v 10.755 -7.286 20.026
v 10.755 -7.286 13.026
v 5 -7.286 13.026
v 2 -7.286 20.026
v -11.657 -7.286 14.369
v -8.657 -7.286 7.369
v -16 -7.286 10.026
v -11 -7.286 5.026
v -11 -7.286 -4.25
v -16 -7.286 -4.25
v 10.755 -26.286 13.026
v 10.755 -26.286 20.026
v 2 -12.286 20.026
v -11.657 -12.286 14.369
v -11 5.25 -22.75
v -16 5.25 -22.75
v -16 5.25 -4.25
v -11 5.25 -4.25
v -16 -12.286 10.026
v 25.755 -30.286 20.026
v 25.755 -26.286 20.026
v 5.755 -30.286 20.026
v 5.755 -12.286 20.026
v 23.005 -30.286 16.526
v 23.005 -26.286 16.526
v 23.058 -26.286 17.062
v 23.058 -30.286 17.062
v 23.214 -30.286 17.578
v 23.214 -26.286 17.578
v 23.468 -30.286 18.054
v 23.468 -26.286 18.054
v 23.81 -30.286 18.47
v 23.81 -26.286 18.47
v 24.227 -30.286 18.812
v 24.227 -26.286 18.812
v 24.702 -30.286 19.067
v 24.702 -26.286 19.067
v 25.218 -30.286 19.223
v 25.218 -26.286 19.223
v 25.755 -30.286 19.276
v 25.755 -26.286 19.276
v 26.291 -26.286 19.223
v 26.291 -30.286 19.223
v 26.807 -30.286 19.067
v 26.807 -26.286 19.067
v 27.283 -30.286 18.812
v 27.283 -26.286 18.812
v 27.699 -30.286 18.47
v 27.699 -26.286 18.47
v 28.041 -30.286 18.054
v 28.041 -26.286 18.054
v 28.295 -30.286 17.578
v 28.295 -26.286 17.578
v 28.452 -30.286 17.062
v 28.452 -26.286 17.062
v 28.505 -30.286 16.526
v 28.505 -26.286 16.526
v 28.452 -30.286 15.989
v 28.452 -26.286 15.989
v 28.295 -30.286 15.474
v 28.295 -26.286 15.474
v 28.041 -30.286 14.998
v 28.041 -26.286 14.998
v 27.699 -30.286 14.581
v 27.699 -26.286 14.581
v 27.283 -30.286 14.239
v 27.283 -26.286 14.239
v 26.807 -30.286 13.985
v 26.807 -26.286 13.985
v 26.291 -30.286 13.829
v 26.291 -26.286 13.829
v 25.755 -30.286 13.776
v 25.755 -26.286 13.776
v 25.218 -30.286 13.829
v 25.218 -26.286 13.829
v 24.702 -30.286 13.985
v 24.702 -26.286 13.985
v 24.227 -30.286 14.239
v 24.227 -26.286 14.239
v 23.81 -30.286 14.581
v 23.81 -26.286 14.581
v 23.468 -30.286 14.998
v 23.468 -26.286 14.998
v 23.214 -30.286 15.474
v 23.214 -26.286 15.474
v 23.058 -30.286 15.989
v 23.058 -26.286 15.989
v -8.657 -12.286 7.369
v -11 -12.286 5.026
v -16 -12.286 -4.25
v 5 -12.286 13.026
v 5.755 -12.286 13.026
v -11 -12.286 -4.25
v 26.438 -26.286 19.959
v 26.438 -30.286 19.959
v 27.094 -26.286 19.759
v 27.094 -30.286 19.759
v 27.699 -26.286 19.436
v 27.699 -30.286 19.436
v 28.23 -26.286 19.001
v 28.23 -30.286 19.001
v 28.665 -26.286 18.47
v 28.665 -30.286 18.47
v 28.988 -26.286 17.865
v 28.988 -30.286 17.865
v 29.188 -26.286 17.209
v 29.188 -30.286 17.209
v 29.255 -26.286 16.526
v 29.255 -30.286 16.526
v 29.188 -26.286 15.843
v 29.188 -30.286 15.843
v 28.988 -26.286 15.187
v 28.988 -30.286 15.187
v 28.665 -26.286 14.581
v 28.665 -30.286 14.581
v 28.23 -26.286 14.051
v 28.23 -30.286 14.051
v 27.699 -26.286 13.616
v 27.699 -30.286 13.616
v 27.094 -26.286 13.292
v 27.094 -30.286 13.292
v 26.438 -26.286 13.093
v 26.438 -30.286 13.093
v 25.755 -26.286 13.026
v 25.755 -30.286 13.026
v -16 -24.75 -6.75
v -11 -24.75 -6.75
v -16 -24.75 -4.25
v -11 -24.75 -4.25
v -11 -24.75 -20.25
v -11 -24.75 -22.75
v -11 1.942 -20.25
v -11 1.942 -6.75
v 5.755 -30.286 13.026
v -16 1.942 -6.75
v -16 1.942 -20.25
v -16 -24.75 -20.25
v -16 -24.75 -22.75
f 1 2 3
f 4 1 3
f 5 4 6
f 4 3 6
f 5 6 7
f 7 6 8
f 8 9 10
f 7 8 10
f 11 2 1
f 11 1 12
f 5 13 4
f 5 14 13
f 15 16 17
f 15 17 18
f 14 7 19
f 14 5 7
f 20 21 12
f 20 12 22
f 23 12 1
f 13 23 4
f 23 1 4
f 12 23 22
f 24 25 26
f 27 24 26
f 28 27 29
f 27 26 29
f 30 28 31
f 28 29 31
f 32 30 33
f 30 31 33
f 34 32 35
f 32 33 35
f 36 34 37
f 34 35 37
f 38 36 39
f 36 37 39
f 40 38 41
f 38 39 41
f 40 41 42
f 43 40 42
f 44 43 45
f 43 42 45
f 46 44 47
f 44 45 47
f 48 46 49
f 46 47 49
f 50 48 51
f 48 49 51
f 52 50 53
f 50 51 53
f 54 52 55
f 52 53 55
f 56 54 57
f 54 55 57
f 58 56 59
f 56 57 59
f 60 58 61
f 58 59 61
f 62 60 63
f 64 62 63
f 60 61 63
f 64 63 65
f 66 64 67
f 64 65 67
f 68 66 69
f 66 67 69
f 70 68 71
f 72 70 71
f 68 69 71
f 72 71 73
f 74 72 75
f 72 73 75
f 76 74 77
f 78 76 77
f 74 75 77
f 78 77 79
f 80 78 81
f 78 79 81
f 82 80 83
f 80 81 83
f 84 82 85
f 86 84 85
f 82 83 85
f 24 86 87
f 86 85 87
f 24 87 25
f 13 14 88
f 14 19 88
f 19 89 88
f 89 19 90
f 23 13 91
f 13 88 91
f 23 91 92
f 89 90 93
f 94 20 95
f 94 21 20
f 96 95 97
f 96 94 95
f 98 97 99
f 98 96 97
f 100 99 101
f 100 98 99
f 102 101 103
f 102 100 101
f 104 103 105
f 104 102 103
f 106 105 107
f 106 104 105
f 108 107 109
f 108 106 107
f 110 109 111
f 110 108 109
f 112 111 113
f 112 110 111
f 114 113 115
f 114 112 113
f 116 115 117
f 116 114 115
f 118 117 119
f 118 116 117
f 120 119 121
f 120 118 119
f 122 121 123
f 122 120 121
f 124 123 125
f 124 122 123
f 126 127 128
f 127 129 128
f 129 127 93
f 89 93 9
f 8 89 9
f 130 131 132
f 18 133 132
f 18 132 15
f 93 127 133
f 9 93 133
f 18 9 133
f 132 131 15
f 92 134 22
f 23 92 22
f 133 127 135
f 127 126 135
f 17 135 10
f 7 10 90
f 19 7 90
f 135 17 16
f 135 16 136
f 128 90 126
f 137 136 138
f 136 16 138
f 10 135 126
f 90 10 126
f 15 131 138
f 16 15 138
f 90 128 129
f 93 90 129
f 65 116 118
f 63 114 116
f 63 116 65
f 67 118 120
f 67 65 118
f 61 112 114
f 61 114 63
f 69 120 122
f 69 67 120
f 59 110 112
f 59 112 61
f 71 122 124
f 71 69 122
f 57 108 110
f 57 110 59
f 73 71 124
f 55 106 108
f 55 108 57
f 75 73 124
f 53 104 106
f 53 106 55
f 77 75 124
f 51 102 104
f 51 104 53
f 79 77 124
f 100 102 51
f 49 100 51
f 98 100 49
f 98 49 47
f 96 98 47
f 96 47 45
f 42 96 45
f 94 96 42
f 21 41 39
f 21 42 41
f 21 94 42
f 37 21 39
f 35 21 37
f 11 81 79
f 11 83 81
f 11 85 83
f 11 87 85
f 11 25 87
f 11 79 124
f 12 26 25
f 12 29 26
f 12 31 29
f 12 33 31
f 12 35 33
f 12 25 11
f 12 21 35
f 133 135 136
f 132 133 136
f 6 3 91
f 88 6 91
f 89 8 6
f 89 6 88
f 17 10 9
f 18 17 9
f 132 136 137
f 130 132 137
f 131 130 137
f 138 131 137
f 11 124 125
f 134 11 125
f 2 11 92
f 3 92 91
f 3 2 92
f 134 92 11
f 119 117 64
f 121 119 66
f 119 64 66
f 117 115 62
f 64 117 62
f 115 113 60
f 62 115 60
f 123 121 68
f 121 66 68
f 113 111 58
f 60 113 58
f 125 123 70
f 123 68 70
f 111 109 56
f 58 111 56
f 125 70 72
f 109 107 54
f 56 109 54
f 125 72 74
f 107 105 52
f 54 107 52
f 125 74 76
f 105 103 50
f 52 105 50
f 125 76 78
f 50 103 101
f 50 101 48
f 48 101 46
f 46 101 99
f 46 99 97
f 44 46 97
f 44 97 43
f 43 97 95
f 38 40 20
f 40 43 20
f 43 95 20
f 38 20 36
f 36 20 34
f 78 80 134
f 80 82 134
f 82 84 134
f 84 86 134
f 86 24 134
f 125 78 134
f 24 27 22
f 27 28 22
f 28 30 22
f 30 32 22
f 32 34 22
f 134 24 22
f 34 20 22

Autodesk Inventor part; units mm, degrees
ref_plane "YZ Plane" through (0, 0, 0) normal (1, 0, 0) x (0, 1, 0)
ref_plane "XZ Plane" through (0, 0, 0) normal (0, 1, 0) x (-1, 0, 0)
ref_plane "Work Plane7" through (19.7548, -26.2861, 10.5259) normal (0, -1, 0) x (1, 0, 0)
sketch "Sketch10" plane through (0, 0, 0) normal (0, 1, 0) x (-1, 0, 0)
  line L0 (-27.0112, 18.5709) -> (-26.4391, 18.8263) projected
  line L1 (-25.8204, 18.925) -> (-26.4391, 18.8263) projected
  line L2 (-25.1972, 18.8603) -> (-25.8204, 18.925) projected
  line L3 (-24.6121, 18.6364) -> (-25.1972, 18.8603) projected
  line L4 (-24.1048, 18.2687) -> (-24.6121, 18.6364) projected
  line L5 (-23.7099, 17.7823) -> (-24.1048, 18.2687) projected
  line L6 (-23.4545, 17.2102) -> (-23.7099, 17.7823) projected
  line L7 (-23.4545, 17.2102) -> (-23.3557, 16.5915) projected
  line L8 (-23.4205, 15.9683) -> (-23.3557, 16.5915) projected
  line L9 (-23.4205, 15.9683) -> (-23.6444, 15.3832) projected
  line L10 (-23.6444, 15.3832) -> (-24.0121, 14.8759) projected
  line L11 (-24.0121, 14.8759) -> (-24.4985, 14.481) projected
  line L12 (-24.4985, 14.481) -> (-25.0706, 14.2256) projected
  line L13 (-25.0706, 14.2256) -> (-25.6893, 14.1268) projected
  line L14 (-25.6893, 14.1268) -> (-26.3125, 14.1916) projected
  line L15 (-26.3125, 14.1916) -> (-26.8976, 14.4155) projected
  line L16 (-26.8976, 14.4155) -> (-27.4049, 14.7832) projected
  line L17 (-27.4049, 14.7832) -> (-27.7998, 15.2696) projected
  line L18 (-28.0552, 15.8417) -> (-27.7998, 15.2696) projected
  line L19 (-28.0552, 15.8417) -> (-28.1539, 16.4604) projected
  line L20 (-28.1539, 16.4604) -> (-28.0892, 17.0836) projected
  line L21 (-28.0892, 17.0836) -> (-27.8653, 17.6687) projected
  line L22 (-27.8653, 17.6687) -> (-27.4976, 18.176) projected
  line L23 (-27.0112, 18.5709) -> (-27.4976, 18.176) projected
  line L24 (-26.7545, 16.4986) -> (-26.7275, 16.7583) projected
  line L25 (-26.7133, 16.2408) -> (-26.7545, 16.4986) projected
  line L26 (-26.6069, 16.0025) -> (-26.7133, 16.2408) projected
  line L27 (-26.4424, 15.7998) -> (-26.6069, 16.0025) projected
  line L28 (-26.231, 15.6466) -> (-26.4424, 15.7998) projected
  line L29 (-25.9872, 15.5533) -> (-26.231, 15.6466) projected
  line L30 (-25.7275, 15.5263) -> (-25.9872, 15.5533) projected
  line L31 (-25.4697, 15.5675) -> (-25.7275, 15.5263) projected
  line L32 (-25.2314, 15.6739) -> (-25.4697, 15.5675) projected
  line L33 (-25.0287, 15.8384) -> (-25.2314, 15.6739) projected
  line L34 (-24.8755, 16.0498) -> (-25.0287, 15.8384) projected
  line L35 (-24.7822, 16.2936) -> (-24.8755, 16.0498) projected
  line L36 (-24.7552, 16.5533) -> (-24.7822, 16.2936) projected
  line L37 (-24.7552, 16.5533) -> (-24.7963, 16.8111) projected
  line L38 (-24.7963, 16.8111) -> (-24.9028, 17.0494) projected
  line L39 (-24.9028, 17.0494) -> (-25.0673, 17.2521) projected
  line L40 (-25.0673, 17.2521) -> (-25.2787, 17.4053) projected
  line L41 (-25.2787, 17.4053) -> (-25.5225, 17.4986) projected
  line L42 (-25.5225, 17.4986) -> (-25.7822, 17.5256) projected
  line L43 (-25.7822, 17.5256) -> (-26.04, 17.4844) projected
  line L44 (-26.04, 17.4844) -> (-26.2783, 17.378) projected
  line L45 (-26.2783, 17.378) -> (-26.481, 17.2135) projected
  line L46 (-26.481, 17.2135) -> (-26.6342, 17.0021) projected
  line L47 (-26.6342, 17.0021) -> (-26.7275, 16.7583) projected
  line L48 (-27.0112, 18.5709) -> (-26.4391, 18.8263) projected
  line L49 (-25.8204, 18.925) -> (-26.4391, 18.8263) projected
  line L50 (-25.1972, 18.8603) -> (-25.8204, 18.925) projected
  line L51 (-24.6121, 18.6364) -> (-25.1972, 18.8603) projected
  line L52 (-24.1048, 18.2687) -> (-24.6121, 18.6364) projected
  line L53 (-23.7099, 17.7823) -> (-24.1048, 18.2687) projected
  line L54 (-23.4545, 17.2102) -> (-23.7099, 17.7823) projected
  line L55 (-23.4545, 17.2102) -> (-23.3557, 16.5915) projected
  line L56 (-23.4205, 15.9683) -> (-23.3557, 16.5915) projected
  line L57 (-23.4205, 15.9683) -> (-23.6444, 15.3832) projected
  line L58 (-23.6444, 15.3832) -> (-24.0121, 14.8759) projected
  line L59 (-24.0121, 14.8759) -> (-24.4985, 14.481) projected
  line L60 (-24.4985, 14.481) -> (-25.0706, 14.2256) projected
  line L61 (-25.0706, 14.2256) -> (-25.6893, 14.1268) projected
  line L62 (-25.6893, 14.1268) -> (-26.3125, 14.1916) projected
  line L63 (-26.3125, 14.1916) -> (-26.8976, 14.4155) projected
  line L64 (-26.8976, 14.4155) -> (-27.4049, 14.7832) projected
  line L65 (-27.4049, 14.7832) -> (-27.7998, 15.2696) projected
  line L66 (-28.0552, 15.8417) -> (-27.7998, 15.2696) projected
  line L67 (-28.0552, 15.8417) -> (-28.1539, 16.4604) projected
  line L68 (-28.1539, 16.4604) -> (-28.0892, 17.0836) projected
  line L69 (-28.0892, 17.0836) -> (-27.8653, 17.6687) projected
  line L70 (-27.8653, 17.6687) -> (-27.4976, 18.176) projected
  line L71 (-27.0112, 18.5709) -> (-27.4976, 18.176) projected
  line L72 (-26.7545, 16.4986) -> (-26.7275, 16.7583) projected
  line L73 (-26.7133, 16.2408) -> (-26.7545, 16.4986) projected
  line L74 (-26.6069, 16.0025) -> (-26.7133, 16.2408) projected
  line L75 (-26.4424, 15.7998) -> (-26.6069, 16.0025) projected
  line L76 (-26.231, 15.6466) -> (-26.4424, 15.7998) projected
  line L77 (-25.9872, 15.5533) -> (-26.231, 15.6466) projected
  line L78 (-25.7275, 15.5263) -> (-25.9872, 15.5533) projected
  line L79 (-25.4697, 15.5675) -> (-25.7275, 15.5263) projected
  line L80 (-25.2314, 15.6739) -> (-25.4697, 15.5675) projected
  line L81 (-25.0287, 15.8384) -> (-25.2314, 15.6739) projected
  line L82 (-24.8755, 16.0498) -> (-25.0287, 15.8384) projected
  line L83 (-24.7822, 16.2936) -> (-24.8755, 16.0498) projected
  line L84 (-24.7552, 16.5533) -> (-24.7822, 16.2936) projected
  line L85 (-24.7552, 16.5533) -> (-24.7963, 16.8111) projected
  line L86 (-24.7963, 16.8111) -> (-24.9028, 17.0494) projected
  line L87 (-24.9028, 17.0494) -> (-25.0673, 17.2521) projected
  line L88 (-25.0673, 17.2521) -> (-25.2787, 17.4053) projected
  line L89 (-25.2787, 17.4053) -> (-25.5225, 17.4986) projected
  line L90 (-25.5225, 17.4986) -> (-25.7822, 17.5256) projected
  line L91 (-25.7822, 17.5256) -> (-26.04, 17.4844) projected
  line L92 (-26.04, 17.4844) -> (-26.2783, 17.378) projected
  line L93 (-26.2783, 17.378) -> (-26.481, 17.2135) projected
  line L94 (-26.481, 17.2135) -> (-26.6342, 17.0021) projected
  line L95 (-26.6342, 17.0021) -> (-26.7275, 16.7583) projected
  circle A0 centre (-25.7548, 16.5259) radius 2.75
  arc A1 (-25.7548, 20.0259) -> (-25.7548, 13.0259) centre (-25.7548, 16.5259) ccw
  line L96 (-25.7548, 20.0259) -> (-5.7548, 20.0259) construction
  line L97 (-25.7548, 13.0259) -> (-5.7548, 13.0259)
  line L98 (-5.7548, 13.0259) -> (-5.7548, 20.0259)
  line L99 (-25.7548, 20.0259) -> (-5.7548, 20.0259)
  point P0 (0, 0)
  dimension "d36" = 5.5
  dimension "d37" = 7
  dimension "d40" = 20
extrude "Extrusion8" add sketch "Sketch10" against normal blind 4 from surface at -26.2861 contours L99 L98 L97 A1
sketch "Sketch12" plane through (0, 0, 0) normal (0, 1, 0) x (-1, 0, 0)
  line L0 (26.2, -19.75) -> (26.2, -7.25) projected
  line L1 (26.2, -19.75) -> (11, -19.75) projected
  line L2 (11, -7.25) -> (11, -19.75) projected
  line L3 (11, -7.25) -> (26.2, -7.25) projected
  line L4 (22.4706, -11.917) -> (22.6, -11.9) projected
  line L5 (22.35, -11.967) -> (22.4706, -11.917) projected
  line L6 (22.2464, -12.0464) -> (22.35, -11.967) projected
  line L7 (22.167, -12.15) -> (22.2464, -12.0464) projected
  line L8 (22.117, -12.2706) -> (22.167, -12.15) projected
  line L9 (22.1, -12.4) -> (22.117, -12.2706) projected
  line L10 (22.117, -12.5294) -> (22.1, -12.4) projected
  line L11 (22.167, -12.65) -> (22.117, -12.5294) projected
  line L12 (22.2464, -12.7536) -> (22.167, -12.65) projected
  line L13 (22.35, -12.833) -> (22.2464, -12.7536) projected
  line L14 (22.35, -12.833) -> (22.4706, -12.883) projected
  line L15 (22.4706, -12.883) -> (22.6, -12.9) projected
  line L16 (22.6, -12.9) -> (22.7294, -12.883) projected
  line L17 (22.85, -12.833) -> (22.7294, -12.883) projected
  line L18 (22.9536, -12.7536) -> (22.85, -12.833) projected
  line L19 (23.033, -12.65) -> (22.9536, -12.7536) projected
  line L20 (23.033, -12.65) -> (23.083, -12.5294) projected
  line L21 (23.083, -12.5294) -> (23.1, -12.4) projected
  line L22 (23.1, -12.4) -> (23.083, -12.2706) projected
  line L23 (23.083, -12.2706) -> (23.033, -12.15) projected
  line L24 (23.033, -12.15) -> (22.9536, -12.0464) projected
  line L25 (22.9536, -12.0464) -> (22.85, -11.967) projected
  line L26 (22.85, -11.967) -> (22.7294, -11.917) projected
  line L27 (22.6, -11.9) -> (22.7294, -11.917) projected
  line L28 (22.4706, -13.017) -> (22.6, -13) projected
  line L29 (22.35, -13.067) -> (22.4706, -13.017) projected
  line L30 (22.2464, -13.1464) -> (22.35, -13.067) projected
  line L31 (22.167, -13.25) -> (22.2464, -13.1464) projected
  line L32 (22.117, -13.3706) -> (22.167, -13.25) projected
  line L33 (22.1, -13.5) -> (22.117, -13.3706) projected
  line L34 (22.117, -13.6294) -> (22.1, -13.5) projected
  line L35 (22.167, -13.75) -> (22.117, -13.6294) projected
  line L36 (22.2464, -13.8536) -> (22.167, -13.75) projected
  line L37 (22.35, -13.933) -> (22.2464, -13.8536) projected
  line L38 (22.35, -13.933) -> (22.4706, -13.983) projected
  line L39 (22.4706, -13.983) -> (22.6, -14) projected
  line L40 (22.6, -14) -> (22.7294, -13.983) projected
  line L41 (22.85, -13.933) -> (22.7294, -13.983) projected
  line L42 (22.9536, -13.8536) -> (22.85, -13.933) projected
  line L43 (23.033, -13.75) -> (22.9536, -13.8536) projected
  line L44 (23.033, -13.75) -> (23.083, -13.6294) projected
  line L45 (23.083, -13.6294) -> (23.1, -13.5) projected
  line L46 (23.1, -13.5) -> (23.083, -13.3706) projected
  line L47 (23.083, -13.3706) -> (23.033, -13.25) projected
  line L48 (23.033, -13.25) -> (22.9536, -13.1464) projected
  line L49 (22.9536, -13.1464) -> (22.85, -13.067) projected
  line L50 (22.85, -13.067) -> (22.7294, -13.017) projected
  line L51 (22.6, -13) -> (22.7294, -13.017) projected
  line L52 (22.4706, -14.117) -> (22.6, -14.1) projected
  line L53 (22.35, -14.167) -> (22.4706, -14.117) projected
  line L54 (22.2464, -14.2464) -> (22.35, -14.167) projected
  line L55 (22.167, -14.35) -> (22.2464, -14.2464) projected
  line L56 (22.117, -14.4706) -> (22.167, -14.35) projected
  line L57 (22.1, -14.6) -> (22.117, -14.4706) projected
  line L58 (22.117, -14.7294) -> (22.1, -14.6) projected
  line L59 (22.167, -14.85) -> (22.117, -14.7294) projected
  line L60 (22.2464, -14.9536) -> (22.167, -14.85) projected
  line L61 (22.35, -15.033) -> (22.2464, -14.9536) projected
  line L62 (22.35, -15.033) -> (22.4706, -15.083) projected
  line L63 (22.4706, -15.083) -> (22.6, -15.1) projected
  line L64 (22.6, -15.1) -> (22.7294, -15.083) projected
  line L65 (22.85, -15.033) -> (22.7294, -15.083) projected
  line L66 (22.9536, -14.9536) -> (22.85, -15.033) projected
  line L67 (23.033, -14.85) -> (22.9536, -14.9536) projected
  line L68 (23.033, -14.85) -> (23.083, -14.7294) projected
  line L69 (23.083, -14.7294) -> (23.1, -14.6) projected
  line L70 (23.1, -14.6) -> (23.083, -14.4706) projected
  line L71 (23.083, -14.4706) -> (23.033, -14.35) projected
  line L72 (23.033, -14.35) -> (22.9536, -14.2464) projected
  line L73 (22.9536, -14.2464) -> (22.85, -14.167) projected
  line L74 (22.85, -14.167) -> (22.7294, -14.117) projected
  line L75 (22.6, -14.1) -> (22.7294, -14.117) projected
  line L76 (8.5, -12.9) -> (11, -12.9) projected
  line L77 (8.5, -7.25) -> (8.5, -12.9) projected
  line L78 (8.5, -7.25) -> (11, -7.25) projected
  line L79 (11, -12.9) -> (11, -7.25) projected
  line L80 (8.5, -19.75) -> (11, -19.75) projected
  line L81 (8.5, -14.1) -> (8.5, -19.75) projected
  line L82 (8.5, -14.1) -> (11, -14.1) projected
  line L83 (11, -19.75) -> (11, -14.1) projected
  line L84 (11, -7.25) -> (16, -7.25)
  line L85 (16, -7.25) -> (16, -19.75)
  line L86 (16, -19.75) -> (11, -19.75)
  line L87 (11, -19.75) -> (11, -7.25)
  line L88 (16, -7.25) -> (11, -7.25)
  line L89 (11, -7.25) -> (11, -4.25)
  line L90 (11, -4.25) -> (16, -4.25)
  line L91 (16, -4.25) -> (16, -7.25)
  line L92 (16, -19.75) -> (11, -19.75)
  line L93 (11, -19.75) -> (11, -22.75)
  line L94 (11, -22.75) -> (16, -22.75)
  line L95 (16, -22.75) -> (16, -19.75)
  point P0 (0, 0)
  dimension "d41" = 5
  dimension "d42" = 3
  dimension "d43" = 3
extrude "Extrusion10" add sketch "Sketch12" against normal blind 24.75 contours L95 L94 L93 L1 | L1 L2 L3 L85 | L3 L89 L90 L91
sketch "Sketch13" plane through (0, 0, 0) normal (0, 1, 0) x (1, 0, 0)
  line L0 (-16, 22.75) -> (-16, 4.25) projected
  line L1 (-16, 4.25) -> (-11, 4.25) projected
  line L2 (-11, 4.25) -> (-11, 22.75) projected
  line L3 (-11, 22.75) -> (-16, 22.75) projected
  point P0 (0, 0)
extrude "Extrusion11" add sketch "Sketch13" along normal blind 5.25
sketch "Sketch14" plane through (-16, -24.75, -4.25) normal (0, 0, 1) x (1, 0, 0)
  line L0 (0, 0) -> (0, 30) projected
  line L1 (5, 0) -> (0, 0) projected
  line L2 (5, 0) -> (5, 30) projected
  line L3 (0, 30) -> (5, 30) projected
  line L4 (21.7548, -5.5361) -> (41.7548, -5.5361) projected
  line L5 (41.7548, -1.5361) -> (41.7548, -5.5361) projected
  line L6 (21.7548, -1.5361) -> (41.7548, -1.5361) projected
  line L7 (21.7548, -5.5361) -> (21.7548, -1.5361) projected
  line L8 (21.7548, -5.5361) -> (26.7548, -5.5361)
  line L9 (26.7548, -5.5361) -> (26.7548, 12.4639)
  line L10 (26.7548, 12.4639) -> (21.7548, 12.4639)
  line L11 (21.7548, 12.4639) -> (21.7548, -5.5361)
  line L12 (0, 0) -> (0, 30) projected
  line L13 (26.7548, 12.4639) -> (0, 12.4639)
  line L14 (0, 12.4639) -> (0, 17.4639)
  line L15 (0, 17.4639) -> (26.7548, 17.4639)
  line L16 (26.7548, 17.4639) -> (26.7548, 12.4639)
  point P0 (16, 24.75)
  dimension "d48" = 5
  dimension "d49" = 18
  dimension "d50" = 5
extrude "Extrusion12" add sketch "Sketch14" along normal up to surface (7 mm away) from surface at 17.2759 contours L0 L15 L2 L13 | L2 L15 L16 L10 L13 | L10 L9 L6 L11 | L6 L9 L4 L7
sketch "Sketch15" plane through (-16, -24.75, -4.25) normal (0, 0, 1) x (1, 0, 0)
  line L0 (41.7548, -1.5361) -> (26.7548, -1.5361) projected
  line L1 (41.7548, -5.5361) -> (41.7548, -1.5361) projected
  line L2 (41.7548, -5.5361) -> (21.7548, -5.5361) projected
  line L3 (21.7548, 12.4639) -> (21.7548, -5.5361) projected
  line L4 (0, 12.4639) -> (21.7548, 12.4639) projected
  line L5 (0, 17.4639) -> (0, 12.4639) projected
  line L6 (26.7548, 17.4639) -> (0, 17.4639) projected
  line L7 (26.7548, -1.5361) -> (26.7548, 17.4639) projected
  line L8 (0, 0) -> (0, 30) projected
  line L9 (5, 0) -> (0, 0) projected
  line L10 (5, 0) -> (5, 30) projected
  line L11 (0, 30) -> (5, 30) projected
  line L12 (0, 17.4639) -> (5, 17.4639)
  line L13 (5, 17.4639) -> (5, 12.4639)
  line L14 (5, 12.4639) -> (0, 12.4639)
  line L15 (0, 12.4639) -> (0, 17.4639)
  point P0 (16, 24.75)
  point P1 (2.919, 35.6962)
extrude "Extrusion13" add sketch "Sketch15" along normal up to surface (17.2759 mm away) contours L10 L4 L5 L6
sketch "Sketch16" plane through (-16, -24.75, -22.75) normal (-1, 0, 0) x (0, 0, 1)
  line L0 (3, 3.4417) -> (15.5, 3.4417) projected
  line L1 (15.5, 3.4417) -> (15.5, 25.9417) projected
  line L2 (15.5, 25.9417) -> (3, 25.9417) projected
  line L3 (3, 3.4417) -> (3, 25.9417) projected
  line L4 (3, 25.9417) -> (15.5, 3.4417)
  line L5 (2.5, 2.6917) -> (16, 2.6917)
  line L6 (16, 2.6917) -> (16, 26.6917)
  line L7 (16, 26.6917) -> (2.5, 26.6917)
  line L8 (2.5, 26.6917) -> (2.5, 2.6917)
  line L9 (2.5, 2.6917) -> (16, 26.6917) construction
  line L10 (16, 2.6917) -> (2.5, 26.6917) construction
  line L11 (2.5, 2.6917) -> (16, 2.6917)
  line L12 (16, 2.6917) -> (16, -0.068)
  line L13 (16, -0.068) -> (2.5, -0.068)
  line L14 (2.5, -0.068) -> (2.5, 2.6917)
  point P0 (22.75, 24.75)
  point P1 (9.25, 14.6917)
  dimension "d55" = 13.5
  dimension "d56" = 24
extrude "Extrusion14" cut sketch "Sketch16" against normal up to surface (5 mm away) contours L3 L4 L0 | L4 L2 L1 | L8 L7 L6 L5 | L5 L12 L13 L14
chamfer "Chamfer1" distance 10 angle 45 1 edges at (-16, -9.7861, 20.0259)
chamfer "Chamfer2" distance 8 angle 45 1 edges at (-11, -9.7861, 13.0259)
chamfer "Chamfer3" distance 8 angle 45 1 edges at (-6, -9.7861, 20.0259)
chamfer "Chamfer4" distance 8 angle 45 1 edges at (-3, -9.7861, 13.0259)
properties part number "armv3"
